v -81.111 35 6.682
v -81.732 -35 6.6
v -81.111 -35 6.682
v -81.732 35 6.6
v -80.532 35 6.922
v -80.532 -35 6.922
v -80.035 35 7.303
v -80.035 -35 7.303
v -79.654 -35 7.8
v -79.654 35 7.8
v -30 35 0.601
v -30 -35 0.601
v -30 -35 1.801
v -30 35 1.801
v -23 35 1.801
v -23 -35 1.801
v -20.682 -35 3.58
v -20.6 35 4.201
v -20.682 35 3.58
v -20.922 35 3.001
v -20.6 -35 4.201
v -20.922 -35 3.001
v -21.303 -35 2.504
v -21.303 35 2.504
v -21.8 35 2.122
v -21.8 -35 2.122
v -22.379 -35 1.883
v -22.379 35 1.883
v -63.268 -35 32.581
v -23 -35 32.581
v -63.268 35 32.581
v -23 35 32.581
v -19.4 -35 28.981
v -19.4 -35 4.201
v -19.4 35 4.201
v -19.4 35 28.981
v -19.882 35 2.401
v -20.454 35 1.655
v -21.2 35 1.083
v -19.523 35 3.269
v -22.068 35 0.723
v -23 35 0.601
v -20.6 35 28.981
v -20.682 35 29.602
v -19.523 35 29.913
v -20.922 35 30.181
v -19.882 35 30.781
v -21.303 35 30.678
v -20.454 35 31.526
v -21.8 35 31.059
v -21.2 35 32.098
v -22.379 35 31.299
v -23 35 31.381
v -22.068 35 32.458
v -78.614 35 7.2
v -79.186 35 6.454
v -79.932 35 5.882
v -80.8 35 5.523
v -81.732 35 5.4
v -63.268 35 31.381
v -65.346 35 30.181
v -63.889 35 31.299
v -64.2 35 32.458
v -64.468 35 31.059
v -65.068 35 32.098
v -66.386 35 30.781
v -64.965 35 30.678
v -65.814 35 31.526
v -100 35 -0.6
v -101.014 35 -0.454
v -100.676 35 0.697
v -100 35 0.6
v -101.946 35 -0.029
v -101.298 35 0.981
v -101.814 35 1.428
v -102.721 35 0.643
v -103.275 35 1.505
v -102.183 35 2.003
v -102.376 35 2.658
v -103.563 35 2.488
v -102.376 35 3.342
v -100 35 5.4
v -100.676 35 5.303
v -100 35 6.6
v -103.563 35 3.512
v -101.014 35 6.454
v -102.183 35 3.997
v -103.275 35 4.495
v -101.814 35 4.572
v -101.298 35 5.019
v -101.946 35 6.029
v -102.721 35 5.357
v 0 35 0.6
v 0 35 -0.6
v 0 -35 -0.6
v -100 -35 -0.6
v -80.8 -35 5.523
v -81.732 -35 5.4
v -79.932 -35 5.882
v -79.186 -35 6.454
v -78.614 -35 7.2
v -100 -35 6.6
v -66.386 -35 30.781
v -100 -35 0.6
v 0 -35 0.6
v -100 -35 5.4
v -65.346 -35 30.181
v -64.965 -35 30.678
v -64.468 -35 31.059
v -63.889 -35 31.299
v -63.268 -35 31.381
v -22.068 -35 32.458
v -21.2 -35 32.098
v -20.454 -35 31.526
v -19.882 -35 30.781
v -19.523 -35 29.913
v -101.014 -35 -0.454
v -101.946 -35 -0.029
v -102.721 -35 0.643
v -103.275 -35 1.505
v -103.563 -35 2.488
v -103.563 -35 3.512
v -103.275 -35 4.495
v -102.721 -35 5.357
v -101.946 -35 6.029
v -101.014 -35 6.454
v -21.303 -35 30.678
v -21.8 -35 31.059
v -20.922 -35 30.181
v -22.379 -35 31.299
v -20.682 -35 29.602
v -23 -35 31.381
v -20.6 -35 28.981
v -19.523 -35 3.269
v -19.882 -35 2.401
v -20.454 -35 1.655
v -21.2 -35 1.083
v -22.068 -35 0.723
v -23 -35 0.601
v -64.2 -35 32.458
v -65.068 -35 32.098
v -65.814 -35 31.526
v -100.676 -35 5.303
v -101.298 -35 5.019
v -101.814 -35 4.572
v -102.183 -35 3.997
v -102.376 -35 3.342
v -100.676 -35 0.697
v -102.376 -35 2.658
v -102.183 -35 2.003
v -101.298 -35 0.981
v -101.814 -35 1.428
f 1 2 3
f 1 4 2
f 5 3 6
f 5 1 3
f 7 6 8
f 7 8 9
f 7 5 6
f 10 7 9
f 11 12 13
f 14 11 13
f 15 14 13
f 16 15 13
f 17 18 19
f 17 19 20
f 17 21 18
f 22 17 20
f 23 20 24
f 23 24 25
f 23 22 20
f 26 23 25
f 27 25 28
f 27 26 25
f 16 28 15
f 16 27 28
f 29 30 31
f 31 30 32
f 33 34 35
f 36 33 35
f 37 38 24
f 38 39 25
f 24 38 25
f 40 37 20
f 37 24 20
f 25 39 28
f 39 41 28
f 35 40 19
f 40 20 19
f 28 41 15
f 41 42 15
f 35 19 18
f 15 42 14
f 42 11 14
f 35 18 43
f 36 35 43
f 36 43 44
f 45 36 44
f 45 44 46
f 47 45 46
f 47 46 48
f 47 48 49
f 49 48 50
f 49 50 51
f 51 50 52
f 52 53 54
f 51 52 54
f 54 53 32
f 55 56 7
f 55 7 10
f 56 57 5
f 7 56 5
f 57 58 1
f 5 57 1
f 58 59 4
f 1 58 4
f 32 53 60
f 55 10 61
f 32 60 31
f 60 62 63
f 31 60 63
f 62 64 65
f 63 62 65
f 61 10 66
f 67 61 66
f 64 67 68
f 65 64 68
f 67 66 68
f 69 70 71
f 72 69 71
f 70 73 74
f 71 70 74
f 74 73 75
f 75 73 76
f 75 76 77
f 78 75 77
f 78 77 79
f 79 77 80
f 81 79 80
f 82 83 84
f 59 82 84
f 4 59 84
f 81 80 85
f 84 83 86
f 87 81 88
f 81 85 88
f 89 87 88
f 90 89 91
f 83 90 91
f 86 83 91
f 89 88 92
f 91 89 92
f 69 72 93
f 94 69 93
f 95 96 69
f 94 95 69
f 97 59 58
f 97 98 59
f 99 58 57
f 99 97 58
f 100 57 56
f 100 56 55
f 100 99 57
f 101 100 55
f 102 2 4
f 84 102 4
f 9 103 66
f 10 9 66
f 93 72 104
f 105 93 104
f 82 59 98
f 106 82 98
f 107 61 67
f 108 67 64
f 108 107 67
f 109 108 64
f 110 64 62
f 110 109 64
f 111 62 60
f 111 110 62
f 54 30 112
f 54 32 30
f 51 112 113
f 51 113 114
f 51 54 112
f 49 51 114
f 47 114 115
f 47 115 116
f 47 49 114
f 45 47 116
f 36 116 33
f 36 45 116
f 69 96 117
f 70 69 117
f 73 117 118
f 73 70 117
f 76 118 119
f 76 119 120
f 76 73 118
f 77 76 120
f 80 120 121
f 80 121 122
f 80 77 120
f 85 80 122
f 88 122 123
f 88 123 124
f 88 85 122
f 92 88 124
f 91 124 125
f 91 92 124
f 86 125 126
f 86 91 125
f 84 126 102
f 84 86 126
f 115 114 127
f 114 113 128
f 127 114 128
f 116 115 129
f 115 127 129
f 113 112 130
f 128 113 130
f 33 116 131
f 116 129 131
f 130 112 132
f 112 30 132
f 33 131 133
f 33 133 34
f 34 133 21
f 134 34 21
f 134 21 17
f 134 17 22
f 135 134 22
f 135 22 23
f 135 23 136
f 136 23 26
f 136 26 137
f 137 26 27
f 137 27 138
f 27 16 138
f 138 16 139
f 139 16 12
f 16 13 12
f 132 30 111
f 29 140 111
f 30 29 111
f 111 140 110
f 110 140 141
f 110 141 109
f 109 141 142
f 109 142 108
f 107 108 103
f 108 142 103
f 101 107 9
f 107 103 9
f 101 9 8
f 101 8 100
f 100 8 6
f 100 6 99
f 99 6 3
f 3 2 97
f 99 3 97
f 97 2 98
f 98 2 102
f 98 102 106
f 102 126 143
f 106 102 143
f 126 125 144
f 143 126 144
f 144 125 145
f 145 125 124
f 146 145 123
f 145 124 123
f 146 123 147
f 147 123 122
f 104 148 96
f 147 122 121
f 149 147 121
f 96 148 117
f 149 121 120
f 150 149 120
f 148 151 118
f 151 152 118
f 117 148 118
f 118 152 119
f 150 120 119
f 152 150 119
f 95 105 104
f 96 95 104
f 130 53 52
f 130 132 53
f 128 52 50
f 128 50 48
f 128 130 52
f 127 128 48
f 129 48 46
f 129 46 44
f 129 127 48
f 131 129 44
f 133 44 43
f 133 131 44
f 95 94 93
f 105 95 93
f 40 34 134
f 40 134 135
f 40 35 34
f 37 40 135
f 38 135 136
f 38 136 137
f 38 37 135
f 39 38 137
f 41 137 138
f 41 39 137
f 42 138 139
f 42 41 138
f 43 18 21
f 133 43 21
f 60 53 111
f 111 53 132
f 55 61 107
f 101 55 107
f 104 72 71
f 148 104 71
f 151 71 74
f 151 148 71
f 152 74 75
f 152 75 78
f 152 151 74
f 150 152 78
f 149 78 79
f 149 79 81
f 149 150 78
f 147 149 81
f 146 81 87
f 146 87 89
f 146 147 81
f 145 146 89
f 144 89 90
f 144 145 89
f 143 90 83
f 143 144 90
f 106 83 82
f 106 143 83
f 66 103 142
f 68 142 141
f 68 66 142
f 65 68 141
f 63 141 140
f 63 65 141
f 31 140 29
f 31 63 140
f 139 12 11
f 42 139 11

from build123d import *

# Parameters (mm, degrees)
SKETCH2_W = 70
SKETCH2_H = 1.2


with BuildPart() as part:
    # Sweep1: sweep along a path in Sketch4
    with BuildLine(Plane(origin=(0, 0, 0), x_dir=(-1, 0, 0), z_dir=(0, 1, 0))) as sweep1_path:
        Line((0, 0), (100, 0))
        ThreePointArc((100, 0), (103, 3), (100, 6))
        Line((100, 6), (81.732050808, 6))
        ThreePointArc((81.732050808, 6), (80.232050808, 6.401923789), (79.133974596, 7.5))
        Line((79.133974596, 7.5), (65.866025404, 30.480762114))
        ThreePointArc((65.866025404, 30.480762114), (64.767949192, 31.578838325), (63.267949192, 31.980762114))
        Line((63.267949192, 31.980762114), (23, 31.980762114))
        ThreePointArc((23, 31.980762114), (20.878679656, 31.102082457), (20, 28.980762114))
        Line((20, 28.980762114), (20, 4.200762114))
        ThreePointArc((20, 4.200762114), (20.878679656, 2.07944177), (23, 1.200762114))
        Line((23, 1.200762114), (30, 1.200762114))
    # Sketch2 → Sweep1 (sweep)
    with BuildSketch(Plane.YZ):
        Rectangle(SKETCH2_W, SKETCH2_H)
    sweep(path=sweep1_path.line)


solid = part.part
